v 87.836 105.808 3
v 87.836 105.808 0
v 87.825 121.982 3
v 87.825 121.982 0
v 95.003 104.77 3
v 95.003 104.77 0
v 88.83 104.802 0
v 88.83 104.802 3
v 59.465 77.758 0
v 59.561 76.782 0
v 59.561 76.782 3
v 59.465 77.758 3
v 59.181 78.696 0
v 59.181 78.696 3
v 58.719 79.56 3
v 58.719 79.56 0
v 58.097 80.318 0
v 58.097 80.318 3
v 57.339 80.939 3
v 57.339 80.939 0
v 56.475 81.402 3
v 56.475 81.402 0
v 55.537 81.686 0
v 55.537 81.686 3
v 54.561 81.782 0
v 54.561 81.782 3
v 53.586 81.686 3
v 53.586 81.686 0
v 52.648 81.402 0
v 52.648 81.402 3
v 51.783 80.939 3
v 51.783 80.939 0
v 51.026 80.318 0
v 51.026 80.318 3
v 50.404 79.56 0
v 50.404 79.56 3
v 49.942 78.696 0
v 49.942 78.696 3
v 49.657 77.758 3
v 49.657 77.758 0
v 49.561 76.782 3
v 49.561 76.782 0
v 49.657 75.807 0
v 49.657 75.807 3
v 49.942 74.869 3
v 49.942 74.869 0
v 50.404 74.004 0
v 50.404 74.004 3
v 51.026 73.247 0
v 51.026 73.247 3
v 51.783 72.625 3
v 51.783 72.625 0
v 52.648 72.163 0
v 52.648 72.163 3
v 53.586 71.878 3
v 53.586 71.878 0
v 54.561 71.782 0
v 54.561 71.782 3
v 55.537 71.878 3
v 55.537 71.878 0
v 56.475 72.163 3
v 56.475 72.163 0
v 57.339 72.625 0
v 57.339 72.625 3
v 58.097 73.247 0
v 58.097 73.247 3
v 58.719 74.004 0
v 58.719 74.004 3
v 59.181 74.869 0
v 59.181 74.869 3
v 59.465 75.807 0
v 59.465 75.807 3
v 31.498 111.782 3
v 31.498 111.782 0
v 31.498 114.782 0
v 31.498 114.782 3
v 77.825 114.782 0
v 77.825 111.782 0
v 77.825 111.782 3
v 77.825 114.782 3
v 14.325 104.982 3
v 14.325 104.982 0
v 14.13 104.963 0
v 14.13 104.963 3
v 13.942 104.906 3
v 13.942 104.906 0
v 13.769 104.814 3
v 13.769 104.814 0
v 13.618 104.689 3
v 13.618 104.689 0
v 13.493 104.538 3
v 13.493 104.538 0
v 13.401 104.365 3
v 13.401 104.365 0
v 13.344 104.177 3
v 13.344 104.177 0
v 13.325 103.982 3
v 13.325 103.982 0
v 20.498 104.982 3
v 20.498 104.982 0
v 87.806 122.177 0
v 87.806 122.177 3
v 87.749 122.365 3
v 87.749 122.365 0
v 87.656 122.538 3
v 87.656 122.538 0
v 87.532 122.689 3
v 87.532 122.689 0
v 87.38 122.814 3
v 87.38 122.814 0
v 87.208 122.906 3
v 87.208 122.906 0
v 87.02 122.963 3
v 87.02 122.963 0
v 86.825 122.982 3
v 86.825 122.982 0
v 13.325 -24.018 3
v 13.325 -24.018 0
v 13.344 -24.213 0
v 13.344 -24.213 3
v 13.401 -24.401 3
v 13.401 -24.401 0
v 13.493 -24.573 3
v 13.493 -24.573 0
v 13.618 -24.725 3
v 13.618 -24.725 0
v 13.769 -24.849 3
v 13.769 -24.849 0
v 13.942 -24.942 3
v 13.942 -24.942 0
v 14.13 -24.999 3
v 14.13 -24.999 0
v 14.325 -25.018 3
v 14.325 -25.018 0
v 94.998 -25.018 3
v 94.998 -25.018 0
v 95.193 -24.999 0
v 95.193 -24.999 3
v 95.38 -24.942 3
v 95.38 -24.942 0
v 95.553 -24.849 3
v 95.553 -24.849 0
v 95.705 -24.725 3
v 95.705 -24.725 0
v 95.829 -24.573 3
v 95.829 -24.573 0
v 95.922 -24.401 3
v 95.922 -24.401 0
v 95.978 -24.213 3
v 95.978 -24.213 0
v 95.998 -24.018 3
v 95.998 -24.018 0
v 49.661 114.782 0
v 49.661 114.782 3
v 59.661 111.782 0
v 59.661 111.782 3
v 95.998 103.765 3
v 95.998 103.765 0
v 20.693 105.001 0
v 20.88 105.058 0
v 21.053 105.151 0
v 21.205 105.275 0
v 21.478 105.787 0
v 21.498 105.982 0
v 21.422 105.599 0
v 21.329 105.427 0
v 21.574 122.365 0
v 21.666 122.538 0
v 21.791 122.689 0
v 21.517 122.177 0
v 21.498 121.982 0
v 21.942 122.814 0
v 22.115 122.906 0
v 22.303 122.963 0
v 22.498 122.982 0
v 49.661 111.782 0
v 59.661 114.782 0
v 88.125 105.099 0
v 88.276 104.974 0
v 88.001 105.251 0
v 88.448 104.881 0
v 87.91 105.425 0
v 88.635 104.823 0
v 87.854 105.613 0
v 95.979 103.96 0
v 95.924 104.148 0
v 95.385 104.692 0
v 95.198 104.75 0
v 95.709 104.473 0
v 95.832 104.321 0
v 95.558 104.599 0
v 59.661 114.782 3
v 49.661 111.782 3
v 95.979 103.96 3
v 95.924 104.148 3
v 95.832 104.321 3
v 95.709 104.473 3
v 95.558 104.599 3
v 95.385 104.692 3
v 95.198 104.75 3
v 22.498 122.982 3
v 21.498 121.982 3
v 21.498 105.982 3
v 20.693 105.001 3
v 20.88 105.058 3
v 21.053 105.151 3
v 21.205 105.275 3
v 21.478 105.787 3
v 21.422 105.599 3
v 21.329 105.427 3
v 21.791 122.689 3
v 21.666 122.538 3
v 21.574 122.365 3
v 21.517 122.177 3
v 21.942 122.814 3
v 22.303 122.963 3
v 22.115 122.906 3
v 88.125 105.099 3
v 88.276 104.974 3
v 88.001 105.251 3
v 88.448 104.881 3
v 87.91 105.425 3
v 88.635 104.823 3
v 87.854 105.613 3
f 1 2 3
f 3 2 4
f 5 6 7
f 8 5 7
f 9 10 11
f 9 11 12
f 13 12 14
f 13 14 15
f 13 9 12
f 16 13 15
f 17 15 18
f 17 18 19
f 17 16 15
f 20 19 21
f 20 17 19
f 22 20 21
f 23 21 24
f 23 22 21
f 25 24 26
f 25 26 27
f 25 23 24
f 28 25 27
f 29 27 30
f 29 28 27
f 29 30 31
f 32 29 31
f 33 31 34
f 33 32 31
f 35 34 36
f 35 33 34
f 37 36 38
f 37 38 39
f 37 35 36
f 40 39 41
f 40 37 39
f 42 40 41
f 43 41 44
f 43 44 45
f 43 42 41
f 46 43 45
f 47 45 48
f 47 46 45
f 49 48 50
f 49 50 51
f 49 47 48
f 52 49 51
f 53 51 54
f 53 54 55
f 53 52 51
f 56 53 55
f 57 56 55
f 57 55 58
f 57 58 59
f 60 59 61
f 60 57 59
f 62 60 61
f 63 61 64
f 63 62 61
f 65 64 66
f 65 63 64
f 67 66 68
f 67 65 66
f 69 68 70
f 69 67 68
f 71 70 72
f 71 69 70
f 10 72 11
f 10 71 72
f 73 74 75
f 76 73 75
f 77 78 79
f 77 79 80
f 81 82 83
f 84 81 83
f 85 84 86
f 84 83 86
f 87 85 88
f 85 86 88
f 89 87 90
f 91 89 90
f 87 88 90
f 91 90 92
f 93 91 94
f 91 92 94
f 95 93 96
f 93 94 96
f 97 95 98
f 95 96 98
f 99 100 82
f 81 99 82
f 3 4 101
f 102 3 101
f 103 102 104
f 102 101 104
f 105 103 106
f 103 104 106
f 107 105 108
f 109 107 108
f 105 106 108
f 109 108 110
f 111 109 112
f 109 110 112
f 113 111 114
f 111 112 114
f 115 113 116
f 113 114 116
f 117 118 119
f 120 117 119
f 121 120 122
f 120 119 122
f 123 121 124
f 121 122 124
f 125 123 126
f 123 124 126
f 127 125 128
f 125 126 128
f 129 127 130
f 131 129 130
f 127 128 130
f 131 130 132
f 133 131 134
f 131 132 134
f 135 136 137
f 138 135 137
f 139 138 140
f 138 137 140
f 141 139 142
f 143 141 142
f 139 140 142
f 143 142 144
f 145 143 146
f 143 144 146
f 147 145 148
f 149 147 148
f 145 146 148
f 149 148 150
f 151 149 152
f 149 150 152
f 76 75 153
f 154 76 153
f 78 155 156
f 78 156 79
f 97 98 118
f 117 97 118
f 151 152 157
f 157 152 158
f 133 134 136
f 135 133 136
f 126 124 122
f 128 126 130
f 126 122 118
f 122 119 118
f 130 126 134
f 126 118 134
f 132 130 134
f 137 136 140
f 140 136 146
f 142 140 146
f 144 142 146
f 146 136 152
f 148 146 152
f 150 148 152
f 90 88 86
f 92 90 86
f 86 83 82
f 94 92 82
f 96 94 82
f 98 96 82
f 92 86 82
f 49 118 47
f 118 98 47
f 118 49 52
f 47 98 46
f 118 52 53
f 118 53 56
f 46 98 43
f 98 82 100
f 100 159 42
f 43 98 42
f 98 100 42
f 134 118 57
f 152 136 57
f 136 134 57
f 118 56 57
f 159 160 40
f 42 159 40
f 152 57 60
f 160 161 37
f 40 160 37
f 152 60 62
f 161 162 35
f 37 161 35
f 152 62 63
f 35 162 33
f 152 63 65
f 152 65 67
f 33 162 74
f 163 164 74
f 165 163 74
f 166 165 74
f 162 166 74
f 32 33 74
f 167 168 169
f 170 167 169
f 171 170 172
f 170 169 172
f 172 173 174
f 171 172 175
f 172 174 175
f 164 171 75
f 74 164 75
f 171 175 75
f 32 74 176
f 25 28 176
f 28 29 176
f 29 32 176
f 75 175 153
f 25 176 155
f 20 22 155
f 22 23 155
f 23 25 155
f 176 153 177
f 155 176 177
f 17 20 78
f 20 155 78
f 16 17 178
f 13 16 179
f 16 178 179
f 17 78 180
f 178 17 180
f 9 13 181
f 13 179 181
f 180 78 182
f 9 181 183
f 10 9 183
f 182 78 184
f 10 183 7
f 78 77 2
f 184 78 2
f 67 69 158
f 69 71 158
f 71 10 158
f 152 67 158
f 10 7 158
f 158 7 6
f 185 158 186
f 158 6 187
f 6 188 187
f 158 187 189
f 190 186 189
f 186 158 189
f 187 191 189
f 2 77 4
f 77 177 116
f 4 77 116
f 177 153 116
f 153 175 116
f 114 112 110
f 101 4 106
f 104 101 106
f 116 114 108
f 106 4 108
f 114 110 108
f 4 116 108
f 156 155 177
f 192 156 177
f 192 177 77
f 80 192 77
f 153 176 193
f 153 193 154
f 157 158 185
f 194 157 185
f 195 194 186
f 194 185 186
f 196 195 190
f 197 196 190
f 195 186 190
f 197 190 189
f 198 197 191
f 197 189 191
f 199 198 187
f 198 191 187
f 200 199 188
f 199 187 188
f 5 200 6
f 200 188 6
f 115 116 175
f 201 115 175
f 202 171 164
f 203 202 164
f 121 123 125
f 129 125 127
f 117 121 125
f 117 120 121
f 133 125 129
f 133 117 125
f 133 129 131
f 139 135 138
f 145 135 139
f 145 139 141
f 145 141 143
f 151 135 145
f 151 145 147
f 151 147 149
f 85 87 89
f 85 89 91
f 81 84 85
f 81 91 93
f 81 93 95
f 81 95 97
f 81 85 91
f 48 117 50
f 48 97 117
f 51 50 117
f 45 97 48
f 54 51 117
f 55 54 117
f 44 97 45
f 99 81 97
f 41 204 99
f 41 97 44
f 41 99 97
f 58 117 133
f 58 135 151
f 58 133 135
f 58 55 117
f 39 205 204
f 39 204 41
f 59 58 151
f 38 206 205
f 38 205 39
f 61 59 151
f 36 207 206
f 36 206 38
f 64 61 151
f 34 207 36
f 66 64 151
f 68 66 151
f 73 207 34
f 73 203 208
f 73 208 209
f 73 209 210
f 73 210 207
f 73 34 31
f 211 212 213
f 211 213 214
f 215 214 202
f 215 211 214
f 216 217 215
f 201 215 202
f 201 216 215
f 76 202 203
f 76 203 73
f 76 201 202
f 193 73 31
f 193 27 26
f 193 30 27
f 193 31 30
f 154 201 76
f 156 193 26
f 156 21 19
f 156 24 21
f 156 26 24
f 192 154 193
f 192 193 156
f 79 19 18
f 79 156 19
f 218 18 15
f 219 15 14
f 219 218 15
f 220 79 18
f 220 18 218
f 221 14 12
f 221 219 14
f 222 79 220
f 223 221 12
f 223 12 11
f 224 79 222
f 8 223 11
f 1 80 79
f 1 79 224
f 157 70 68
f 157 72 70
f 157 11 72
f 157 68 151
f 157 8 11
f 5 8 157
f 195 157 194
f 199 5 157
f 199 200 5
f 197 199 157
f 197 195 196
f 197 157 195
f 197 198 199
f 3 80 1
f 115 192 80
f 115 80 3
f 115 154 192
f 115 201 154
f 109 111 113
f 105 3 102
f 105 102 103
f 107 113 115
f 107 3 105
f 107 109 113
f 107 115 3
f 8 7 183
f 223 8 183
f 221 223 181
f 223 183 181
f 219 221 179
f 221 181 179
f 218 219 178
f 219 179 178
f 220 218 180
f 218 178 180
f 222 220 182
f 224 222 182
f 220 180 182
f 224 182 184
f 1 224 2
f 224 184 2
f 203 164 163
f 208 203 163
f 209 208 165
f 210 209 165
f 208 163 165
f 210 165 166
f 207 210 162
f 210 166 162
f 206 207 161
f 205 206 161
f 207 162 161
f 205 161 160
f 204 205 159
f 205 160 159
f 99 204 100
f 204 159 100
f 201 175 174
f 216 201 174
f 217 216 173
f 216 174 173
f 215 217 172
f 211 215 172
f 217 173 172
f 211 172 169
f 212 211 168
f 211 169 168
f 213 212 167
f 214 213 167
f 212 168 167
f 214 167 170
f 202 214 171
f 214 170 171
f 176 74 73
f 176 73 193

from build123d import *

# Parameters (mm, degrees)
MODEL_R                 = 5
MODEL_W                 = 18.163611367
MODEL_H                 = 3
MODEL_W_2               = 18.163611368
SALIENTE_EXTRUIR1_DEPTH = 3


with BuildPart() as part:
    # Model → Saliente-Extruir1 (new body)
    with BuildSketch(Plane.XY):
        with BuildLine():
            Line((95.99768192, -24.017865973), (95.99768192, 103.764725177))
            ThreePointArc((95.99768192, 103.764725177), (95.708514347, 104.473363697), (95.002958892, 104.769974448))
            Line((95.002958892, 104.769974448), (88.830267122, 104.802462525))
            ThreePointArc((88.830267122, 104.802462525), (88.124711667, 105.099073276), (87.835544094, 105.807711796))
            Line((87.835544094, 105.807711796), (87.824904655, 121.982134027))
            ThreePointArc((87.824904655, 121.982134027), (87.532011436, 122.689240808), (86.824904655, 122.982134027))
            Line((86.824904655, 122.982134027), (22.49768192, 122.982134027))
            ThreePointArc((22.49768192, 122.982134027), (21.790575139, 122.689240808), (21.49768192, 121.982134027))
            Line((21.49768192, 121.982134027), (21.49768192, 105.982134027))
            ThreePointArc((21.49768192, 105.982134027), (21.204788701, 105.275027246), (20.49768192, 104.982134027))
            Line((20.49768192, 104.982134027), (14.324904655, 104.982134027))
            ThreePointArc((14.324904655, 104.982134027), (13.617797874, 104.689240808), (13.324904655, 103.982134027))
            Line((13.324904655, 103.982134027), (13.324904655, 59.982134027))
            Line((13.324904655, 59.982134027), (13.324904655, 53.982134027))
            Line((13.324904655, 53.982134027), (13.324904655, 21.297944303))
            Line((13.324904655, 21.297944303), (13.324904655, -24.017865973))
            ThreePointArc((13.324904655, -24.017865973), (13.617797874, -24.724972754), (14.324904655, -25.017865973))
            Line((14.324904655, -25.017865973), (94.99768192, -25.017865973))
            ThreePointArc((94.99768192, -25.017865973), (95.704788701, -24.724972754), (95.99768192, -24.017865973))
        make_face()
        with Locations((54.561293288, 76.782134027)):
            Circle(MODEL_R, mode=Mode.SUBTRACT)
        with Locations((68.743098972, 113.282134027)):
            Rectangle(MODEL_W, MODEL_H, mode=Mode.SUBTRACT)
        with Locations((40.579487604, 113.282134027)):
            Rectangle(MODEL_W_2, MODEL_H, mode=Mode.SUBTRACT)
    extrude(amount=SALIENTE_EXTRUIR1_DEPTH)


solid = part.part
